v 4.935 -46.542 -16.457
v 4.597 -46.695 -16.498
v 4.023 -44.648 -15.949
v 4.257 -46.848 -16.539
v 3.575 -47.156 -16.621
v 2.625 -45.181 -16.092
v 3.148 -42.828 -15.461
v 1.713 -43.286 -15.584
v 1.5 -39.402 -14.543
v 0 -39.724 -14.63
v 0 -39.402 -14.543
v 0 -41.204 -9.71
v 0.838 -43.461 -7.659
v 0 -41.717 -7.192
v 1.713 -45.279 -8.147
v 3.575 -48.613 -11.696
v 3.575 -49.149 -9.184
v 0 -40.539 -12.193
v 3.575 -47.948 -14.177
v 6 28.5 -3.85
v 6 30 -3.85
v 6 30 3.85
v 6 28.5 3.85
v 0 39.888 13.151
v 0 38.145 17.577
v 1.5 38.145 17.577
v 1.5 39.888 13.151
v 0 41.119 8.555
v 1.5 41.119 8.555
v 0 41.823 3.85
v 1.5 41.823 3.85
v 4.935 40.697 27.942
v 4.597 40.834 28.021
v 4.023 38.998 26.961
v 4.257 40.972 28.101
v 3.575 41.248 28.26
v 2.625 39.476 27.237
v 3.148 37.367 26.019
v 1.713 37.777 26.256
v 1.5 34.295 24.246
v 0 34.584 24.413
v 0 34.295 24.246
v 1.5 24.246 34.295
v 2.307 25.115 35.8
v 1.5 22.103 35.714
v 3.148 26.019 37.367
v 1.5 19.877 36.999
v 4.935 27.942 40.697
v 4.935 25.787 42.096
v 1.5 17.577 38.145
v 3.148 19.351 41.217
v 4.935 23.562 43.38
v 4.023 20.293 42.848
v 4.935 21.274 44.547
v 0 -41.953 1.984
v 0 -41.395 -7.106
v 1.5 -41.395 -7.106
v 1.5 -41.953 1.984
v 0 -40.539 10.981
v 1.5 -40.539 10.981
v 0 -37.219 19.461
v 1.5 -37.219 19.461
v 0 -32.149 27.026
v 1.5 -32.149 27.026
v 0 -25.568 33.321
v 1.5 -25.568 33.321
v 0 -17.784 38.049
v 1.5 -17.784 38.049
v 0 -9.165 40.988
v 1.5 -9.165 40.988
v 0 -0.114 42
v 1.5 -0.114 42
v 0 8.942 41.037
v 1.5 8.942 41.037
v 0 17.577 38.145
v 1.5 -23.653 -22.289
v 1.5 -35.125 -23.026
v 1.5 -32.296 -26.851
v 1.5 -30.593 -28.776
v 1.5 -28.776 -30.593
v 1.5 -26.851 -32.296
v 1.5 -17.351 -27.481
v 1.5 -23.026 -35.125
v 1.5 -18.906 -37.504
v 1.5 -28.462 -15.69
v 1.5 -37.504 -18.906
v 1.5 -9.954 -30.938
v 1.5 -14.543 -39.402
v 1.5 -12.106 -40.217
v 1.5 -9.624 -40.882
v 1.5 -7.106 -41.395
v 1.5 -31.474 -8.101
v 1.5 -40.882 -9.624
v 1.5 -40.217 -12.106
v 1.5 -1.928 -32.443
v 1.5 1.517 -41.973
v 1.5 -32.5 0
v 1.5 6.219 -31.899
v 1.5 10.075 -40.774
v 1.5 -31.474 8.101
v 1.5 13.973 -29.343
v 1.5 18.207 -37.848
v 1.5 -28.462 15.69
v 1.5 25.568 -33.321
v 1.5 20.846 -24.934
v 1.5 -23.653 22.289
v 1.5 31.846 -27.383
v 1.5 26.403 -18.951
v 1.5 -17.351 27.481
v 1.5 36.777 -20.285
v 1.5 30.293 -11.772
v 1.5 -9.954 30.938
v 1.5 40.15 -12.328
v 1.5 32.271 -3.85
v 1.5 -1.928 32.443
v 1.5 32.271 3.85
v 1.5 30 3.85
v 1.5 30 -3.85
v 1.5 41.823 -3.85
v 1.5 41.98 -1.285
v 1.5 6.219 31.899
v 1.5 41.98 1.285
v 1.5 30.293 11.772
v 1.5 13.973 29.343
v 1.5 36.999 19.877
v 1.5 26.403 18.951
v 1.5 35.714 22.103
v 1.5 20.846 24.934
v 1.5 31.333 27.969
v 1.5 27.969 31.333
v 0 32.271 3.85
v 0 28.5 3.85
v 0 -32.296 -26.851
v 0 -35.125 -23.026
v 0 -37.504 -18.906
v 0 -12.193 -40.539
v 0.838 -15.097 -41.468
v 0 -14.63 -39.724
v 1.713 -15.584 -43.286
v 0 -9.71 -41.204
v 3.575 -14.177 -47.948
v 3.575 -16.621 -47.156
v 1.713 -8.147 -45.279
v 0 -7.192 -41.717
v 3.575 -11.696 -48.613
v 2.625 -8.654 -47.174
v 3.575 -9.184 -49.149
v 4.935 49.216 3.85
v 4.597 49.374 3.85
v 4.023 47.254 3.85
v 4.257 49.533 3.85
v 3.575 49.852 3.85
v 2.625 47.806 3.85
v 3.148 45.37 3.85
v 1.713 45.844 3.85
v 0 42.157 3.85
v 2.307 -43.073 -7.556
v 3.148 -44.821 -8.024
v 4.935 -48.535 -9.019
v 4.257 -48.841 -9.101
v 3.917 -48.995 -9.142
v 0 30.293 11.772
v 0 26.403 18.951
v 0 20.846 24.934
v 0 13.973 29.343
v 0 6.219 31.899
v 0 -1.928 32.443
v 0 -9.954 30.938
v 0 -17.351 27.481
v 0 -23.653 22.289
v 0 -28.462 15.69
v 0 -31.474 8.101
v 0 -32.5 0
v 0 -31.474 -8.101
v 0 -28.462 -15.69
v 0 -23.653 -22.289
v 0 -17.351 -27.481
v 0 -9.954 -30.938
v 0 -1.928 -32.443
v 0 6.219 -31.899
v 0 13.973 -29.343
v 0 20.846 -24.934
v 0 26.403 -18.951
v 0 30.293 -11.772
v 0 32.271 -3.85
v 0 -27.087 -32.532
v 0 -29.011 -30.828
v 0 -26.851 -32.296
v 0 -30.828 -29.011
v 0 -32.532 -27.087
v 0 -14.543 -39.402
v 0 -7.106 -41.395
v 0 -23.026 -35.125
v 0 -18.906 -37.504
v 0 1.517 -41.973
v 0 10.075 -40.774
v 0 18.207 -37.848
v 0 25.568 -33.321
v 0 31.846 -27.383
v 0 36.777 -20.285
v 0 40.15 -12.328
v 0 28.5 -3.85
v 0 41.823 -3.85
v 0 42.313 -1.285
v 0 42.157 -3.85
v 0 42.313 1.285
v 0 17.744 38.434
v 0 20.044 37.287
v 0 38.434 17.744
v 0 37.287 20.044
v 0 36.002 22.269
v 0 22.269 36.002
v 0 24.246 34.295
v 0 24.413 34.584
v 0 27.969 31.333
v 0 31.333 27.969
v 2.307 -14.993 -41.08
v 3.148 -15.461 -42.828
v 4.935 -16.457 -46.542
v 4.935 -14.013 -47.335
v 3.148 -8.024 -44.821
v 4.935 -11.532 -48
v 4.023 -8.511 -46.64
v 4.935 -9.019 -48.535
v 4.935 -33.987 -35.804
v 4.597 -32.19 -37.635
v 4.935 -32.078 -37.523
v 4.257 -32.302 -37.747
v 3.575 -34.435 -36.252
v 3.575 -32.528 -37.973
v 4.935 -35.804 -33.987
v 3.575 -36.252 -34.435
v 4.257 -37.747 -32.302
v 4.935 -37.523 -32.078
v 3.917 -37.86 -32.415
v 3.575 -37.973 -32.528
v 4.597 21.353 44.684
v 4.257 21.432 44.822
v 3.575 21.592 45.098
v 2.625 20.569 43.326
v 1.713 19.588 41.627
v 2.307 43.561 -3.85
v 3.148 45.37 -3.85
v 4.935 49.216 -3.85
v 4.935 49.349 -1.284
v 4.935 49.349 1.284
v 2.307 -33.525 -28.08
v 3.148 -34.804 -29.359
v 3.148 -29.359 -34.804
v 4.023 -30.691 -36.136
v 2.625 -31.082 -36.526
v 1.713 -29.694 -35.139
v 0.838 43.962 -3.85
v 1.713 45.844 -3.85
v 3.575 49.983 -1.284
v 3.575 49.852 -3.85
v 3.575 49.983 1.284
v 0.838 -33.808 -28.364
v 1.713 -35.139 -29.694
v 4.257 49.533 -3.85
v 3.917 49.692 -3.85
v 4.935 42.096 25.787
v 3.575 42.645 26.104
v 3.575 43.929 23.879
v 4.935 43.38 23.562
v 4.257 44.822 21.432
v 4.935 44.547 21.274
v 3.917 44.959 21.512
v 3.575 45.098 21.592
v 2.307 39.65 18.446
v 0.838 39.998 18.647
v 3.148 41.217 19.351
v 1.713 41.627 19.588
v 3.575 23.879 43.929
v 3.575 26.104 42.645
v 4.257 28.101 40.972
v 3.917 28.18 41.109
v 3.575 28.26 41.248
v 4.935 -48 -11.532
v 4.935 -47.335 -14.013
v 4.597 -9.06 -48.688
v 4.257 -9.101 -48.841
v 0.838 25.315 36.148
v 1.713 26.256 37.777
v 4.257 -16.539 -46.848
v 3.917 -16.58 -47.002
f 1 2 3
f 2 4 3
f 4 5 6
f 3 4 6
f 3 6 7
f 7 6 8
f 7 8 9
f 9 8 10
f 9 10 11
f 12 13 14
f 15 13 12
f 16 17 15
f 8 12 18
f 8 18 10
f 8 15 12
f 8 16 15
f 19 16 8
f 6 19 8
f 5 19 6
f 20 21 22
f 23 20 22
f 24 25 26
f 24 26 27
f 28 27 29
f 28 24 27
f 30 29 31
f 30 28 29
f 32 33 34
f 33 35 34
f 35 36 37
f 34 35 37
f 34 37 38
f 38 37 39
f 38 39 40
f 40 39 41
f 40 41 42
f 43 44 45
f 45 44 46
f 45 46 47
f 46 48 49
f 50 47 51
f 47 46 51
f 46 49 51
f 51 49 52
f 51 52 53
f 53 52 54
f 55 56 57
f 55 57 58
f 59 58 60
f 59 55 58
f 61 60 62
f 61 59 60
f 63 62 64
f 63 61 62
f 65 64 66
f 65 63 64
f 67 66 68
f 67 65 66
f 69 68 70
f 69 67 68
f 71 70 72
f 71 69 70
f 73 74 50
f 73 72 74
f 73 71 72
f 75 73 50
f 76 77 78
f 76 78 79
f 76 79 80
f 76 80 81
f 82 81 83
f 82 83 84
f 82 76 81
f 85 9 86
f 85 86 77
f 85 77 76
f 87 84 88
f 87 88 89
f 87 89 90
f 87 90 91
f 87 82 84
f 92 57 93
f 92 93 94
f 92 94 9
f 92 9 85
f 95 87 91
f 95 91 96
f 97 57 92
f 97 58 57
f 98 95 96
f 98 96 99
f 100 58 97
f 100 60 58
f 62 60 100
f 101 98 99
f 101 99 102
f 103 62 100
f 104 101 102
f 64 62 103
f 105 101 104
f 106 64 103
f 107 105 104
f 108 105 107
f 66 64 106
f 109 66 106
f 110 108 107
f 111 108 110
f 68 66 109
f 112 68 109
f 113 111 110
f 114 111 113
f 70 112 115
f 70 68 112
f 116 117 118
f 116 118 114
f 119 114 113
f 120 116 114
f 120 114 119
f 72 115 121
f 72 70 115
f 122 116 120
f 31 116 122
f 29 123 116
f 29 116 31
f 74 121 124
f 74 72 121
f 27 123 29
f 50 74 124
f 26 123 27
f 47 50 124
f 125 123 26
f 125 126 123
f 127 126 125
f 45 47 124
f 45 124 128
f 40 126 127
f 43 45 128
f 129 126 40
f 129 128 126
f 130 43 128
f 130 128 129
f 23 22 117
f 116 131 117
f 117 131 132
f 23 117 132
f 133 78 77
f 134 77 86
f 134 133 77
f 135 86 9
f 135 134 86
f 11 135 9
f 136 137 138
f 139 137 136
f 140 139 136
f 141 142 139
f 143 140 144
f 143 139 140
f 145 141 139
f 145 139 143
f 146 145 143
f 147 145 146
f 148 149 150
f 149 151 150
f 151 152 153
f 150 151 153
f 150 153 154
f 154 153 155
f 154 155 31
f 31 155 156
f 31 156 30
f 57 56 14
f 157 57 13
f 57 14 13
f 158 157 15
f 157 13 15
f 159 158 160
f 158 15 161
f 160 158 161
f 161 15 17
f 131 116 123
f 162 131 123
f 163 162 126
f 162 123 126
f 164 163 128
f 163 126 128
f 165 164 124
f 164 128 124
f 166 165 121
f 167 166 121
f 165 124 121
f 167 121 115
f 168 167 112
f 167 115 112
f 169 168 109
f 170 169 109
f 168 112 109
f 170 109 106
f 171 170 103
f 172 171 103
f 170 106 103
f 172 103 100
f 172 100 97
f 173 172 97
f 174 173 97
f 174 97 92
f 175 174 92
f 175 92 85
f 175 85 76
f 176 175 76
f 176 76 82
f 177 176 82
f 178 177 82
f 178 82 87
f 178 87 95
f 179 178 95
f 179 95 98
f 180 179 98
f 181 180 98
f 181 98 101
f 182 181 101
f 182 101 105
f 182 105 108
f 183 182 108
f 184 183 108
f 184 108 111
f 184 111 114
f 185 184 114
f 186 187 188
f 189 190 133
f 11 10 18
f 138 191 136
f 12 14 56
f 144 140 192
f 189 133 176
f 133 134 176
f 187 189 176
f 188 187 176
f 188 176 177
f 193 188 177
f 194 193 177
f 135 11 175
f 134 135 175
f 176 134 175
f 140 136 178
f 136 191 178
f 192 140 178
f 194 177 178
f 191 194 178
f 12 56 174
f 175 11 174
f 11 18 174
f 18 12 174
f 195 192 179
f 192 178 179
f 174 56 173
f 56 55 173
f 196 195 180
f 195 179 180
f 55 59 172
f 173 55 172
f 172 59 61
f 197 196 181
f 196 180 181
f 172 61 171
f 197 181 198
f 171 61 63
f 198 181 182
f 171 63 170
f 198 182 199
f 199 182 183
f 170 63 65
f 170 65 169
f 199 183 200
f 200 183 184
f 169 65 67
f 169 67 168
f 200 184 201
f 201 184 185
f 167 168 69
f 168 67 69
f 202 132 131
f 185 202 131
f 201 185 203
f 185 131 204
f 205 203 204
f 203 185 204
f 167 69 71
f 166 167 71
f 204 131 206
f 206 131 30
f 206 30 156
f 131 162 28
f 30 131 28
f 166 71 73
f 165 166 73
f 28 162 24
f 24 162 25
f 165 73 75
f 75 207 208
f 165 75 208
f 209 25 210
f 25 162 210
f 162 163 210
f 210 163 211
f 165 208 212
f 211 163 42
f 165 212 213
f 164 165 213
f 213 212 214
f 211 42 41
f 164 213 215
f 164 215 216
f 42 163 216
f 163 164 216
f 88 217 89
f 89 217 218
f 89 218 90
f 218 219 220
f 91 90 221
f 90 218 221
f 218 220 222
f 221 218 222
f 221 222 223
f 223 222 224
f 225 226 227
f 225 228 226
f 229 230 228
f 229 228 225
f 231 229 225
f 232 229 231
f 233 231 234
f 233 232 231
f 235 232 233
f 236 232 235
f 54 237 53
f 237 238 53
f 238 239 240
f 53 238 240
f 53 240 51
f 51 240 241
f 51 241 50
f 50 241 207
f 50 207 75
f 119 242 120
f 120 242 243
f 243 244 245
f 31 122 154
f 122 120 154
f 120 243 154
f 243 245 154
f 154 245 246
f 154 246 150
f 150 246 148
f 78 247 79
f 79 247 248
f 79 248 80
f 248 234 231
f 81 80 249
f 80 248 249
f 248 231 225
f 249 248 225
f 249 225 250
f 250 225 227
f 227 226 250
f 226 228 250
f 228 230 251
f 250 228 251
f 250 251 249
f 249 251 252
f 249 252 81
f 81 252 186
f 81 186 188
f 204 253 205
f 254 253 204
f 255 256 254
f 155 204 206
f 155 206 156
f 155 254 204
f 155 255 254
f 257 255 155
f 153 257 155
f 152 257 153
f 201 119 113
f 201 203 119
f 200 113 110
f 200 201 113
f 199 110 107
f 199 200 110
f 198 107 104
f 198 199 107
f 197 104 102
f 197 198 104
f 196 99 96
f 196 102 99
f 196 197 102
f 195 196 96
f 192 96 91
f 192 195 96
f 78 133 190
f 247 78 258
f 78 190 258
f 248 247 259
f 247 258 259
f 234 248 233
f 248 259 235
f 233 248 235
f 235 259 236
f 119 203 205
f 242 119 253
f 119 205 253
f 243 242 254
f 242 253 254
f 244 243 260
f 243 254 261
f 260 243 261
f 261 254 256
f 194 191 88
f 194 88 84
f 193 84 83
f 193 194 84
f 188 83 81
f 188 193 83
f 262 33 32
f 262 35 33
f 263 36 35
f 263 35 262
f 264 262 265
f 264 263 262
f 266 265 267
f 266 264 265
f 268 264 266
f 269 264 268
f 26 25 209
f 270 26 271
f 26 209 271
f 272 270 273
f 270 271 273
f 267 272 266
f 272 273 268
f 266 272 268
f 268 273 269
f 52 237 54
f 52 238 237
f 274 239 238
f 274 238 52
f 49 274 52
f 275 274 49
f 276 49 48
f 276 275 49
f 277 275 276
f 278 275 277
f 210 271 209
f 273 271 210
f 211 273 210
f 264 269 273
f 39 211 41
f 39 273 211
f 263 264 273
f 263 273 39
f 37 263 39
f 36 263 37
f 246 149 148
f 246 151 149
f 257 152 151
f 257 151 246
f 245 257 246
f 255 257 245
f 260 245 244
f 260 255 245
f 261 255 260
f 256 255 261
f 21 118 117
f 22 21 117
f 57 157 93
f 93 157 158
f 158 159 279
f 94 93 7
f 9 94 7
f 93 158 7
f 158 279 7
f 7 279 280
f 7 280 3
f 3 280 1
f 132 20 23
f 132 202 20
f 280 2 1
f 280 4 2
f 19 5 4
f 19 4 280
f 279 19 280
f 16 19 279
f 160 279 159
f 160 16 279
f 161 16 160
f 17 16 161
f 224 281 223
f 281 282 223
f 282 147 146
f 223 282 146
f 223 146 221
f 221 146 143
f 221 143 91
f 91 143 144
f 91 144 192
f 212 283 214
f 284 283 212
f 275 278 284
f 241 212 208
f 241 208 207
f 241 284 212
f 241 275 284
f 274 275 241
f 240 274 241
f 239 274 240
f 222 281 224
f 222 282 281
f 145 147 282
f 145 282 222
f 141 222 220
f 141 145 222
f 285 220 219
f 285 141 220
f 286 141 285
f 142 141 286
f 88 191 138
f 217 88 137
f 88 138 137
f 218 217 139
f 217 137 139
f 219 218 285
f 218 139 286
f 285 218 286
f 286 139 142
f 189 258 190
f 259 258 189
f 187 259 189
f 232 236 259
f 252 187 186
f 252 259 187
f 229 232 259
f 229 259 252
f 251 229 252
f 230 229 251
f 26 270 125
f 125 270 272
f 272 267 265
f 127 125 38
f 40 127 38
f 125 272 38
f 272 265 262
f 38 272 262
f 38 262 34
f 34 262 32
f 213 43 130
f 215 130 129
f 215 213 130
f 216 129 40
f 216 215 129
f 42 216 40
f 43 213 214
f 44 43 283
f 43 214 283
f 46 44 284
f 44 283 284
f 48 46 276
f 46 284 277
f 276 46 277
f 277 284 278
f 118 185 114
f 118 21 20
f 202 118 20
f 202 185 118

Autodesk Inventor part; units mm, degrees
ref_plane "YZ Plane" through (0, 0, 0) normal (1, 0, 0) x (0, 1, 0)
ref_plane "XZ Plane" through (0, 0, 0) normal (0, 1, 0) x (-1, 0, 0)
sketch "草图1" plane through (0, 0, 0) normal (0, 0, 1) x (1, 0, 0)
  line L0 (-0.580263, 0) -> (3.481577, 0)
  line L1 (0, 3.8) -> (0, 13.95)
  line L2 (0, 42.332542) -> (3.575394, 50)
  line L3 (3.575394, 50) -> (4.934856, 49.366073)
  line L4 (4.934856, 49.366073) -> (1.5, 42)
  line L5 (1.5, 42) -> (1.5, 32.5)
  line L6 (1.5, 32.5) -> (0, 32.5)
  dimension "d1" = 1.5
  dimension "d2" = 65
  dimension "d3" = 84
  dimension "d4" = 100
  dimension "d5" = 25
  dimension "d6" = 1.5
sketch "草图1 outline for 轴承体" plane through (0, 0, 0) normal (0, 0, 1) x (1, 0, 0)
  line L0 (3.575394, 50) -> (0, 42.332542)
  line L1 (4.934856, 49.366073) -> (3.575394, 50)
  line L2 (1.5, 42) -> (4.934856, 49.366073)
  line L3 (1.5, 32.5) -> (1.5, 42)
  line L4 (0, 32.5) -> (1.5, 32.5)
  line L5 (0, 42.332542) -> (0, 32.5)
revolve "轴承体" add sketch "草图1 outline for 轴承体" angle 360 about axis through (-10, 0, 0) along (1, 0, 0)
sketch "草图2" plane through (0, 0, 0) normal (-1, 0, 0) x (0, 0, 1)
  line L0 (0, -70) -> (0, 70)
  line L1 (3.85, 32.271156) -> (3.85, 28.5)
  line L2 (3.85, 28.5) -> (0, 28.5)
  line L3 (-3.85, 32.271156) -> (-3.85, 28.5)
  line L4 (-3.85, 28.5) -> (0, 28.5)
  line L5 (-70, 0) -> (70, 0)
  circle A0 centre (0, 0) radius 32.5
  circle A1 centre (0, 0) radius 50
  circle A2 centre (0, 0) radius 42
  line L6 (-3.85, 30) -> (3.85, 30)
  circle A3 centre (0, 0) radius 42.332542
  line L7 (3.85, 41.823169) -> (3.85, 49.851555)
  line L8 (0, 70) -> (0, -70)
  line L9 (0, 0) -> (25, 43.30127) construction
  line L10 (17.577387, 38.144927) -> (21.59158, 45.097713)
  line L11 (24.245783, 34.294927) -> (28.259975, 41.247713)
  line L12 (-3.85, 41.823169) -> (-3.85, 49.851555)
  line L13 (0, 0) -> (43.30127, 25) construction
  line L14 (34.294927, 24.245783) -> (41.247713, 28.259975)
  line L15 (38.144927, 17.577387) -> (45.097713, 21.59158)
  line L16 (0, 0) -> (-48.296291, -12.940952) construction
  line L17 (-41.394533, -7.105818) -> (-49.149357, -9.183717)
  line L18 (-39.401626, -14.543447) -> (-47.156451, -16.621346)
  line L19 (0, 0) -> (-35.355339, -35.355339) construction
  line L20 (0, 0) -> (-12.940952, -48.296291) construction
  line L21 (-32.295808, -26.851086) -> (-37.972733, -32.528011)
  line L22 (-26.851086, -32.295808) -> (-32.528011, -37.972733)
  line L23 (-14.543447, -39.401626) -> (-16.621346, -47.156451)
  line L24 (-7.105818, -41.394533) -> (-9.183717, -49.149357)
  dimension "d9" = 7.7
  dimension "d21" = 1.5
  dimension "d25" = 61
  dimension "d32" = 7.7
  dimension "d34" = 7.7
  dimension "d36" = 30
  dimension "d38" = 3.85
  dimension "d39" = 30
  dimension "d40" = 15
  dimension "d41" = 7.7
  dimension "d42" = 30
  dimension "d43" = 30
  dimension "d45" = 7.7
  dimension "d47" = 7.7
sketch "草图2 outline for 切口" plane through (0, 0, 0) normal (-1, 0, 0) x (0, 0, 1)
  arc A0 (-14.543447, -39.401626) -> (-26.851086, -32.295808) centre (0, 0) cw
  line L0 (-16.621346, -47.156451) -> (-14.543447, -39.401626)
  arc A1 (-32.528011, -37.972733) -> (-16.621346, -47.156451) centre (0, 0) ccw
  line L1 (-26.851086, -32.295808) -> (-32.528011, -37.972733)
  arc A2 (-32.295808, -26.851086) -> (-39.401626, -14.543447) centre (0, 0) cw
  line L2 (-37.972733, -32.528011) -> (-32.295808, -26.851086)
  arc A3 (-47.156451, -16.621346) -> (-37.972733, -32.528011) centre (0, 0) ccw
  line L3 (-39.401626, -14.543447) -> (-47.156451, -16.621346)
  line L4 (3.85, 49.851555) -> (3.85, 41.823169)
  arc A4 (21.59158, 45.097713) -> (3.85, 49.851555) centre (0, 0) ccw
  line L5 (17.577387, 38.144927) -> (21.59158, 45.097713)
  arc A5 (3.85, 41.823169) -> (17.577387, 38.144927) centre (0, 0) cw
  line L6 (28.259975, 41.247713) -> (24.245783, 34.294927)
  arc A6 (41.247713, 28.259975) -> (28.259975, 41.247713) centre (0, 0) ccw
  line L7 (34.294927, 24.245783) -> (41.247713, 28.259975)
  arc A7 (24.245783, 34.294927) -> (34.294927, 24.245783) centre (0, 0) cw
  arc A8 (-41.394533, -7.105818) -> (-3.85, 41.823169) centre (0, 0) cw
  line L8 (-49.149357, -9.183717) -> (-41.394533, -7.105818)
  arc A9 (-3.85, 49.851555) -> (-49.149357, -9.183717) centre (0, 0) ccw
  line L9 (-3.85, 41.823169) -> (-3.85, 49.851555)
  line L10 (45.097713, 21.59158) -> (38.144927, 17.577387)
  arc A10 (-9.183717, -49.149357) -> (45.097713, 21.59158) centre (0, 0) ccw
  line L11 (-7.105818, -41.394533) -> (-9.183717, -49.149357)
  arc A11 (38.144927, 17.577387) -> (-7.105818, -41.394533) centre (0, 0) cw
extrude "切口" cut sketch "草图2 outline for 切口" against normal through all
extrude "榫1" add sketch "草图2" against normal blind 1.5 contours L4 L3 L6 L0 | L0 L6 L1 L2 | A0 L0 L6 L3 | L1 L6 L0 A0
extrude "榫2" add sketch "草图2" against normal blind 6 contours L4 L3 L6 L0 | L0 L6 L1 L2
ref_plane "Work Plane1" through (0.75, 0, 0) normal (0, 0, -1) x (1, 0, 0)
equation "\"d1\" = SD"
equation "\"d2\" = SD1"
equation "\"d3\" = LADI"
equation "\"d4\" = SD2"
equation "\"d5\" = FAWI"
equation "\"d6\" = SD"
equation "\"d9\" = TW0"
equation "\"d21\" = SD"
equation "\"d25\" = SD3"
equation "\"d32\" = TW0"
equation "\"d34\" = TW0"
equation "\"d36\" = SEWI"
equation "\"d39\" = SEWI"
equation "\"d40\" = ANG1"
equation "\"d41\" = TW0"
equation "\"d42\" = SEWI"
equation "\"d43\" = SEWI"
equation "\"d45\" = TW0"
equation "\"d47\" = TW0"
equation "\"d17\" = SD"
equation "\"d13\" = SD"
equation "\"d23\" = TL1"
equation "\"FAWI\" = 25deg"
equation "\"SD1\" = 65"
equation "\"SD2\" = 100"
equation "\"SD\" = 1.5"
equation "\"TW0\" = 7.7"
equation "\"LADI\" = 84"
equation "\"d8\" = SD1"
equation "\"TL1\" = 6"
equation "\"SD3\" = 61"
equation "\"SEWI\" = 30deg"
equation "\"ANG1\" = 15deg"
equation "\"RR\" = 0.1"
equation "\"NND\" = 64"
equation "\"PB\" = TW0"
equation "\"PNT\" = TL1"
properties part number "垫圈 GB 858 64" material "钢，软"
